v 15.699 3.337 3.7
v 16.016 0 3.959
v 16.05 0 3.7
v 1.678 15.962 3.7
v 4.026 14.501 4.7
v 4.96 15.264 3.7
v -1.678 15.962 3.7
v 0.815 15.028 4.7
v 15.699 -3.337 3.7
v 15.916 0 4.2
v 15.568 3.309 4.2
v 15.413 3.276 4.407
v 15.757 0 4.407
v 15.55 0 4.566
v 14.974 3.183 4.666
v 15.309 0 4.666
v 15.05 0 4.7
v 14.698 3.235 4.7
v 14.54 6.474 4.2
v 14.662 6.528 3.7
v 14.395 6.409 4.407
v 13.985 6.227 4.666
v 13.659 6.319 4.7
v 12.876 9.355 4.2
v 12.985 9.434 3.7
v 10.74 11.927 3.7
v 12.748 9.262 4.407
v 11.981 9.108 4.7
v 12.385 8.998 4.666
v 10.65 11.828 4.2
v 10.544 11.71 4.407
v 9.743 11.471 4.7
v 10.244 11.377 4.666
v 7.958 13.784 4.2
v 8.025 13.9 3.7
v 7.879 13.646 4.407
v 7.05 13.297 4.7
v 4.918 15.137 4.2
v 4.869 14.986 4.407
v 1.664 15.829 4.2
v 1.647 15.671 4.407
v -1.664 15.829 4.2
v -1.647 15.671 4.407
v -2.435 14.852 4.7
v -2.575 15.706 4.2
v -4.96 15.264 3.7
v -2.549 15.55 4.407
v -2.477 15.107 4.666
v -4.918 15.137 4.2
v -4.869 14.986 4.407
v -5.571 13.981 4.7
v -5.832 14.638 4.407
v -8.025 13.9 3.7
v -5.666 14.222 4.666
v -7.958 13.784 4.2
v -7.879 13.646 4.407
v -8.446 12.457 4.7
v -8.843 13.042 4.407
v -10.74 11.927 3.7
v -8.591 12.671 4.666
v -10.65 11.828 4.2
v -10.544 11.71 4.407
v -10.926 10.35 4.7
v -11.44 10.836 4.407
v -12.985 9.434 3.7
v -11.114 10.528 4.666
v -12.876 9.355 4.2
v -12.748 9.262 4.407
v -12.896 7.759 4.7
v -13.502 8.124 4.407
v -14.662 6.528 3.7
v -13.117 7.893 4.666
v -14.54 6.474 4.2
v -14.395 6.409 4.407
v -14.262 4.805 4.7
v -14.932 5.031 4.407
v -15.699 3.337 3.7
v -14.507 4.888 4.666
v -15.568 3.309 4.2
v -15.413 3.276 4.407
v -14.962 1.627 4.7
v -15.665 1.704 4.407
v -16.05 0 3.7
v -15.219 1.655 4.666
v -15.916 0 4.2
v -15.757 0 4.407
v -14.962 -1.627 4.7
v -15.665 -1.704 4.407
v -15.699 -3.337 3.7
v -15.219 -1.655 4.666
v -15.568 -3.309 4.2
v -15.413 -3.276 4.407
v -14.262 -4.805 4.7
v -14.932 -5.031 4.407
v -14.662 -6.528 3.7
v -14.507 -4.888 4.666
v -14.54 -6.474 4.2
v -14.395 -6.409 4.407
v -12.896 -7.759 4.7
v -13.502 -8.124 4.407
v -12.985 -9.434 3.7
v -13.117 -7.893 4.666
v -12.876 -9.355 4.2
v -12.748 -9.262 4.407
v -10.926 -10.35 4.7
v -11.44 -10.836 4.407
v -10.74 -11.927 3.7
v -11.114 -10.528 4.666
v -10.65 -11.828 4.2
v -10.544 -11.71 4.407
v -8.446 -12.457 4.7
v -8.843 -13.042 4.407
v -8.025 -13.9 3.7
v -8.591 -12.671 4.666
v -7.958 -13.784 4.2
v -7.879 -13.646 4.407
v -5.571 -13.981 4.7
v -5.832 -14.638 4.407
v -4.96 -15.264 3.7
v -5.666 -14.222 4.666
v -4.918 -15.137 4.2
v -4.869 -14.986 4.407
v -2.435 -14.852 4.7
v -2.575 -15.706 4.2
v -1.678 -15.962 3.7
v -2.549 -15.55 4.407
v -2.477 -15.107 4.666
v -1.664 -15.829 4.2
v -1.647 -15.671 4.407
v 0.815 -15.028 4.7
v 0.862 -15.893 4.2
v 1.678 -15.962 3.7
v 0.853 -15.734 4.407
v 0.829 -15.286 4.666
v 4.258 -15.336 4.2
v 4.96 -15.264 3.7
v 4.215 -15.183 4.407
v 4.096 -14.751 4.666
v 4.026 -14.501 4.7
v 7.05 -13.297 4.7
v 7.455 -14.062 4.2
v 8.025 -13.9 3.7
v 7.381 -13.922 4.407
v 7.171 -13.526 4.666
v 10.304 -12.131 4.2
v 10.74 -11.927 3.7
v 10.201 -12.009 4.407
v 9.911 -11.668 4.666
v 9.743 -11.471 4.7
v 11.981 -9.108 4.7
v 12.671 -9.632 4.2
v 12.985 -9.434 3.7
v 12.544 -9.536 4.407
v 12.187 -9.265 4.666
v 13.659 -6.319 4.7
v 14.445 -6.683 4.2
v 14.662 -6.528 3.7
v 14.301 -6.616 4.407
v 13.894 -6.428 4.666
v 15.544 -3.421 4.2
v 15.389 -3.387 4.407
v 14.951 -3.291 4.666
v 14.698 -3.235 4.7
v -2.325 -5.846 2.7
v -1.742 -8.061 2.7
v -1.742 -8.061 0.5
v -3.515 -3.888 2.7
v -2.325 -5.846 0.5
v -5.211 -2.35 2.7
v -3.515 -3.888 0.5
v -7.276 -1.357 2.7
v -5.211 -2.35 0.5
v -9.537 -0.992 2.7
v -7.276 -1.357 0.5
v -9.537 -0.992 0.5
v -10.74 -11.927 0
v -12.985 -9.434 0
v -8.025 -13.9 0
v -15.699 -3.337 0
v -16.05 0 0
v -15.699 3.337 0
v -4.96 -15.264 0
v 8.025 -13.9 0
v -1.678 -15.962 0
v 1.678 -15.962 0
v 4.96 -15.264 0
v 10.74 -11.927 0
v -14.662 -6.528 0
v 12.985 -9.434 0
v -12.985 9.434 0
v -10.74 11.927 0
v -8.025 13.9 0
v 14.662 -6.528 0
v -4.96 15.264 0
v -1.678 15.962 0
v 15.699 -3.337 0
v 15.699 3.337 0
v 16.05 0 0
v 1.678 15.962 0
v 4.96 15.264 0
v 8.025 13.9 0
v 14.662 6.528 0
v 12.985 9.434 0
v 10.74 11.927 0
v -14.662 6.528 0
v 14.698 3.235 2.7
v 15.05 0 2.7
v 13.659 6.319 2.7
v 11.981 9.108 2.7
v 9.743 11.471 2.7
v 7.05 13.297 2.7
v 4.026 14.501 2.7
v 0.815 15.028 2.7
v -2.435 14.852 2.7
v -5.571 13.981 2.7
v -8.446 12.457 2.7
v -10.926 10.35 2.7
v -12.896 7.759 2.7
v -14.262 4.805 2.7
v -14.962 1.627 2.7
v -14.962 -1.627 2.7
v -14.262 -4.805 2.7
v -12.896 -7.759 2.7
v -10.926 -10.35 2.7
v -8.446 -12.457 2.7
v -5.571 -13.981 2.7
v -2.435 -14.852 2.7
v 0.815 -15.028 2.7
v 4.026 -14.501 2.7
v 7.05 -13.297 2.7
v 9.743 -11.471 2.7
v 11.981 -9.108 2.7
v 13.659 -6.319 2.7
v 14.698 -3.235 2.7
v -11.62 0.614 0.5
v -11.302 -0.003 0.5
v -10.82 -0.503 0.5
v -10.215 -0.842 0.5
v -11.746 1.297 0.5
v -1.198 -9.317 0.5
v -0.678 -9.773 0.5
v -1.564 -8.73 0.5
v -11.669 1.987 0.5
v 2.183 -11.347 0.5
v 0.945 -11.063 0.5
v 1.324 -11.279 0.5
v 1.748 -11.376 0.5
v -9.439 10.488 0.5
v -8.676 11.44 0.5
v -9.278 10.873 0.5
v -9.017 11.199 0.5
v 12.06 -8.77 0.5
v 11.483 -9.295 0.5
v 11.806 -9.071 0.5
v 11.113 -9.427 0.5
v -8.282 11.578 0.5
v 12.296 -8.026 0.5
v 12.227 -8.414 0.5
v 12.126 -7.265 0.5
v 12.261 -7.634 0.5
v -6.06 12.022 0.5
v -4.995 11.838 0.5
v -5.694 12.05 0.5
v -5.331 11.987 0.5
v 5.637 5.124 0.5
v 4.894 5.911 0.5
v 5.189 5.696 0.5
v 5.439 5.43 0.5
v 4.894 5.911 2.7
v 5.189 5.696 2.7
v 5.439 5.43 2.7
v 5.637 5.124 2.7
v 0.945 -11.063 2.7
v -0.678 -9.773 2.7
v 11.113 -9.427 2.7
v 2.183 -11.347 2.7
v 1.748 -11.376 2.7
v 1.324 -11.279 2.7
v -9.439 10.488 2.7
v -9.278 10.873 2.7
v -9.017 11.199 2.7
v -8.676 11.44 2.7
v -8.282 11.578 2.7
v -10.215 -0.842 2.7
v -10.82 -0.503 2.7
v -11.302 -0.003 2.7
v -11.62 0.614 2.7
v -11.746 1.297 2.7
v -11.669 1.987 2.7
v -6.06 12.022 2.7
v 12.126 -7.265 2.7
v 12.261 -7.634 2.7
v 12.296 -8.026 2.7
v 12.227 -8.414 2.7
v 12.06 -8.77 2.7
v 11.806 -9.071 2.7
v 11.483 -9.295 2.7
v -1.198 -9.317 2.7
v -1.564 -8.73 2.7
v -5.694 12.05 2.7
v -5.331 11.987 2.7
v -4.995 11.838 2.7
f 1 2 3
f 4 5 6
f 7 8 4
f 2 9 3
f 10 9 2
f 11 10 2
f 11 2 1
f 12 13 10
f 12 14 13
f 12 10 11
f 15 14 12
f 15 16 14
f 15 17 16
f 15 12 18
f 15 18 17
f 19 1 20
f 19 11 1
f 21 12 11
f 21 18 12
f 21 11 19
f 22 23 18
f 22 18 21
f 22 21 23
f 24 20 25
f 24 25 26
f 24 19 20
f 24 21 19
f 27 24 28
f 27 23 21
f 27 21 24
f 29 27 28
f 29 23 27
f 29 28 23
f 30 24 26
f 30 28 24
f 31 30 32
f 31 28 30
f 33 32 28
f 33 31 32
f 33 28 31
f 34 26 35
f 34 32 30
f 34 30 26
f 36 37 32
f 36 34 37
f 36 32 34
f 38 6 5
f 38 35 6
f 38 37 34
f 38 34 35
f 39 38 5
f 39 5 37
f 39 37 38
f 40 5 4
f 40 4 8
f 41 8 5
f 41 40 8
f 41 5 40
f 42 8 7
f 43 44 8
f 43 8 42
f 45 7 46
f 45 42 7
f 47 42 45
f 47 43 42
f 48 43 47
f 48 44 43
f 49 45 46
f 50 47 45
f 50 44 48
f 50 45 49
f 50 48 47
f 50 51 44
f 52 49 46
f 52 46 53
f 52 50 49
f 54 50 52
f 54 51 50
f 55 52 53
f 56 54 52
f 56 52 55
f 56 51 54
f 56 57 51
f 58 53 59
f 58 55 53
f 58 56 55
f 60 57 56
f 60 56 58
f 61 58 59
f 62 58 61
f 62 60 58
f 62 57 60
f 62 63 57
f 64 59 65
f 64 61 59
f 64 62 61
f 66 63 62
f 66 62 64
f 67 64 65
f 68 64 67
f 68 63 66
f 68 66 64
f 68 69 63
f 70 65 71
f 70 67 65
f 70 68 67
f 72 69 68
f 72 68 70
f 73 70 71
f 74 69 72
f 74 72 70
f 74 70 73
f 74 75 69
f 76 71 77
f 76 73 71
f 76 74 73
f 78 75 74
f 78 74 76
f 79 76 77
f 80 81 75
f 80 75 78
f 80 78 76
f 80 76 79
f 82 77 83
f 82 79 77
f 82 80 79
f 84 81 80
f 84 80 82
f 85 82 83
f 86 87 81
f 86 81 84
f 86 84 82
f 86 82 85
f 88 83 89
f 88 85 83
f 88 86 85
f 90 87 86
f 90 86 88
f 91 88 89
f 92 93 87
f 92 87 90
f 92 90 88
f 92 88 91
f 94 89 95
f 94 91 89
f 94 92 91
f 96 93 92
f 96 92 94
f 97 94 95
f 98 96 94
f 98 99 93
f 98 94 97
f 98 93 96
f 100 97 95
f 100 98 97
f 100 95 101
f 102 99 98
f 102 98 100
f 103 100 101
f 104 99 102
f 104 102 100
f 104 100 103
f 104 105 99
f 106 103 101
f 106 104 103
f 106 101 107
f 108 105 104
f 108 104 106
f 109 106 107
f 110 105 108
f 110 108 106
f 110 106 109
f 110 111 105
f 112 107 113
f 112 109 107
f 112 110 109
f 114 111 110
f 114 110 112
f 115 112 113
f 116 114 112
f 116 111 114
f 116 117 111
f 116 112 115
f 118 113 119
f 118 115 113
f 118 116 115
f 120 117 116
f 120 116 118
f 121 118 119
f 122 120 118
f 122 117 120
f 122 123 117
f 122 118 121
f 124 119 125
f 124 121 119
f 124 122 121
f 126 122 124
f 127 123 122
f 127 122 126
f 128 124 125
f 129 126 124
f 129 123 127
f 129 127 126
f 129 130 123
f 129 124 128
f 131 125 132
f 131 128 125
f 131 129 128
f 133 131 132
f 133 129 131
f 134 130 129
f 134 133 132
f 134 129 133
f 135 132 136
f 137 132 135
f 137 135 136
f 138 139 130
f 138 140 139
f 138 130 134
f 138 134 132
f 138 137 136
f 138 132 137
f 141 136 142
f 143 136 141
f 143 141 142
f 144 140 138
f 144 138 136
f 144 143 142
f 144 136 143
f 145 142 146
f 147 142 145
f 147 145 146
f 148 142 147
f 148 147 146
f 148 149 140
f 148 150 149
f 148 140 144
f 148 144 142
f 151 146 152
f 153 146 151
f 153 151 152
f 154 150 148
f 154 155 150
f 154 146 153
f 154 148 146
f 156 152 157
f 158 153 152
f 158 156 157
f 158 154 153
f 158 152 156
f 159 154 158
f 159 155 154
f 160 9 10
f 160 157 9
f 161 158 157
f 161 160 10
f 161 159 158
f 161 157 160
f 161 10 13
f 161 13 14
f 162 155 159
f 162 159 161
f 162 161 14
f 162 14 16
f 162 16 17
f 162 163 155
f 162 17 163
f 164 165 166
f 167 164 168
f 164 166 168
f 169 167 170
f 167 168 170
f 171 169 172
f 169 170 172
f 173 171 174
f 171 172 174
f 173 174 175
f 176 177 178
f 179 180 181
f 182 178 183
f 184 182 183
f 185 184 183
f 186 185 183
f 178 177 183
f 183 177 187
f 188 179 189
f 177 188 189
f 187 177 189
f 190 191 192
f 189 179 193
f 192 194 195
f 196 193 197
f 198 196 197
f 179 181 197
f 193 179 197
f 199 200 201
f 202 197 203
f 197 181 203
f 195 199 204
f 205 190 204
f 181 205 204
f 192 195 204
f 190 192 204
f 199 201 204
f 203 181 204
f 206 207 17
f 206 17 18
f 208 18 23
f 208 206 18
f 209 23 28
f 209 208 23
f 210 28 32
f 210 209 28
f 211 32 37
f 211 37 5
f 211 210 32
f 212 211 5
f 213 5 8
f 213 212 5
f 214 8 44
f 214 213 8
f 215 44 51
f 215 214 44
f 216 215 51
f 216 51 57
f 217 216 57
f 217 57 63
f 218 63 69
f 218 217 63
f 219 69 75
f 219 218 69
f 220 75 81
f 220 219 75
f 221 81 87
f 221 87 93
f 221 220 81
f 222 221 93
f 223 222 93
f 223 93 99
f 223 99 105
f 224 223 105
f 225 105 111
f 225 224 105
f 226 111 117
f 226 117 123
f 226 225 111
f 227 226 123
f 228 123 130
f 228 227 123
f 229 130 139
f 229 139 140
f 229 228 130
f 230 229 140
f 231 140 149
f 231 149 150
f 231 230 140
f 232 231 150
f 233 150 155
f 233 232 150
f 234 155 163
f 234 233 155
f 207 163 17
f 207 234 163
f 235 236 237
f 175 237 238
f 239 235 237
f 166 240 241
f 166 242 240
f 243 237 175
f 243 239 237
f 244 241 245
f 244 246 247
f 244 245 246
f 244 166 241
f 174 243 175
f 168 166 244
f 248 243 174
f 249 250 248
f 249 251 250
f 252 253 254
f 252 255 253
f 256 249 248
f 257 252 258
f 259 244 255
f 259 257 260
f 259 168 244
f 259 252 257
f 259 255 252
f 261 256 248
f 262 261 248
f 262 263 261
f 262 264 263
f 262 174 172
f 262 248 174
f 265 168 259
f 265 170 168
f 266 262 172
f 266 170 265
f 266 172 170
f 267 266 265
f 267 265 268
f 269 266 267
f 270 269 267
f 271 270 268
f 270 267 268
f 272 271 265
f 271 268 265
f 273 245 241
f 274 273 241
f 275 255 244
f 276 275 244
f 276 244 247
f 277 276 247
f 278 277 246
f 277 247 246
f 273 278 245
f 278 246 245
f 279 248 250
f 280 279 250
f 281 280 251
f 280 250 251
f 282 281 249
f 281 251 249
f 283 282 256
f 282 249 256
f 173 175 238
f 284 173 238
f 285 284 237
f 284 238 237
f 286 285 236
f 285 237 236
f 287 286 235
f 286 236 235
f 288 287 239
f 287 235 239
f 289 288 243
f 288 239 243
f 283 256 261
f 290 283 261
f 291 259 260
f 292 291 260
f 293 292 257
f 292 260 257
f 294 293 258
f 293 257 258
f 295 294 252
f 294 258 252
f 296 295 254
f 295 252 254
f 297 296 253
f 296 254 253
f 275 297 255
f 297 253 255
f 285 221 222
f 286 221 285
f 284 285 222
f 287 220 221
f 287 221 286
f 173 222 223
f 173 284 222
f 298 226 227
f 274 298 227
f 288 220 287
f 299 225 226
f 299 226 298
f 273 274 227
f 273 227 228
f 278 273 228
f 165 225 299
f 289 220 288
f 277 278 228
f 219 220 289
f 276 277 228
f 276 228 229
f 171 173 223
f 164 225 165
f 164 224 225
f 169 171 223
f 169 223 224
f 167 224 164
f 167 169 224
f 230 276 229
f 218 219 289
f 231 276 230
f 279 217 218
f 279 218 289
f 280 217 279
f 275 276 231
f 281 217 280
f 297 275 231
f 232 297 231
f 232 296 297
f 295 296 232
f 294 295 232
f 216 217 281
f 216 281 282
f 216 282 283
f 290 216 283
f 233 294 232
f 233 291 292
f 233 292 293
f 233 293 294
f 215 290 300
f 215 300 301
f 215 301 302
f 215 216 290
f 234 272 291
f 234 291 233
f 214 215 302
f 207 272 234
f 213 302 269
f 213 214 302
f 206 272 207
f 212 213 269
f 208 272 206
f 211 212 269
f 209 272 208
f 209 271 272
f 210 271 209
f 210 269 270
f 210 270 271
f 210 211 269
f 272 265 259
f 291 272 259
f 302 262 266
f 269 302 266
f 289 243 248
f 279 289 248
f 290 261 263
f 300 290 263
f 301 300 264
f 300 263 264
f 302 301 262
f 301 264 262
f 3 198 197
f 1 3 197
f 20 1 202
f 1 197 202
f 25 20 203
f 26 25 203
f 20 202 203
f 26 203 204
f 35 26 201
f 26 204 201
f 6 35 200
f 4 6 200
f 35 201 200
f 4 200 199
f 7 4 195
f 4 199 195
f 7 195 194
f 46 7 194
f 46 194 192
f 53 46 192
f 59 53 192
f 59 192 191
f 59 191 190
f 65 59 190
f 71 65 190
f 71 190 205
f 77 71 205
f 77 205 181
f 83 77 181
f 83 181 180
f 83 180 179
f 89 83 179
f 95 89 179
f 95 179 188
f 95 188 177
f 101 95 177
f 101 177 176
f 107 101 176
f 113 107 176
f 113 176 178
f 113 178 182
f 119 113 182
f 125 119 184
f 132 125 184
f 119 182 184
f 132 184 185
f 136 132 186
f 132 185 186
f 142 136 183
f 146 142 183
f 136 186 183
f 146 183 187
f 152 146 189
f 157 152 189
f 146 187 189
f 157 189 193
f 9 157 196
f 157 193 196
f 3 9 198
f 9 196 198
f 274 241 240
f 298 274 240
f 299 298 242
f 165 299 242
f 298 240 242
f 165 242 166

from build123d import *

# Parameters (mm, degrees)
F0_R     = 16.05
F1_DEPTH = 2.7
F2_R     = 16.05
F2_R_2   = 15.05
F3_DEPTH = 2
F4_R     = 0.99999
F5_R     = 16.05
F6_DEPTH = 0.5


# Not quite as in the source:
# - a fillet or chamfer is up to 0.001 mm smaller than in the source, because OpenCascade refuses the exact size


with BuildPart() as f1:
    # F0 (on Top) → F1 (new body)
    with BuildSketch(Plane.XY):
        Circle(F0_R)
        with BuildLine():
            ThreePointArc((-0.6780739779, -9.7725818409), (-1.4027582732, -9.0367076796), (-1.7421252674, -8.061254886))
            ThreePointArc((-1.7421252674, -8.061254886), (-4.3074337596, -3.0577956653), (-9.536973063, -0.9920438631))
            ThreePointArc((-9.536973063, -0.9920438631), (-11.3022646183, -0.0029612607), (-11.6691612698, 1.9869948988))
            Line((-11.6691612698, 1.9869948988), (-9.4391799782, 10.4875703743))
            ThreePointArc((-9.4391799782, 10.4875703743), (-9.0171024282, 11.1985139757), (-8.2824484024, 11.5778208766))
            Line((-8.2824484024, 11.5778208766), (-6.0604061806, 12.0222295772))
            ThreePointArc((-6.0604061806, 12.0222295772), (-5.5105978167, 12.029415178), (-4.9951399441, 11.8379888177))
            Line((-4.9951399441, 11.8379888177), (4.893855989, 5.9114030387))
            ThreePointArc((4.893855989, 5.9114030387), (5.3199805506, 5.5689093688), (5.6374422976, 5.1238227536))
            Line((5.6374422976, 5.1238227536), (12.1259901628, -7.2648903372))
            ThreePointArc((12.1259901628, -7.2648903372), (12.1554437407, -8.5973863607), (11.1125476049, -9.4273145597))
            Line((11.1125476049, -9.4273145597), (2.1831787086, -11.347409045))
            ThreePointArc((2.1831787086, -11.347409045), (1.5325569034, -11.3429782119), (0.9450171886, -11.0634689113))
            Line((0.9450171886, -11.0634689113), (-0.6780739779, -9.7725818409))
        make_face(mode=Mode.SUBTRACT)
    extrude(amount=F1_DEPTH)

    # F2 (on face) → F3 (join)
    with BuildSketch(Plane.XY.offset(2.7)):
        Circle(F2_R)
        Circle(F2_R_2, mode=Mode.SUBTRACT)
    extrude(amount=F3_DEPTH)

    # F4 (radius 1 in the source; OpenCascade refuses exactly that, so slightly less here)
    f4_edges = [f1.edges().sort_by_distance(p)[0] for p in [
        (-16.05, 0, 4.7),
    ]]
    fillet(f4_edges, radius=F4_R)

    # F5 (on face) → F6 (join)
    with BuildSketch(Plane.XY):
        Circle(F5_R)
    extrude(amount=F6_DEPTH)


solid = f1.part
